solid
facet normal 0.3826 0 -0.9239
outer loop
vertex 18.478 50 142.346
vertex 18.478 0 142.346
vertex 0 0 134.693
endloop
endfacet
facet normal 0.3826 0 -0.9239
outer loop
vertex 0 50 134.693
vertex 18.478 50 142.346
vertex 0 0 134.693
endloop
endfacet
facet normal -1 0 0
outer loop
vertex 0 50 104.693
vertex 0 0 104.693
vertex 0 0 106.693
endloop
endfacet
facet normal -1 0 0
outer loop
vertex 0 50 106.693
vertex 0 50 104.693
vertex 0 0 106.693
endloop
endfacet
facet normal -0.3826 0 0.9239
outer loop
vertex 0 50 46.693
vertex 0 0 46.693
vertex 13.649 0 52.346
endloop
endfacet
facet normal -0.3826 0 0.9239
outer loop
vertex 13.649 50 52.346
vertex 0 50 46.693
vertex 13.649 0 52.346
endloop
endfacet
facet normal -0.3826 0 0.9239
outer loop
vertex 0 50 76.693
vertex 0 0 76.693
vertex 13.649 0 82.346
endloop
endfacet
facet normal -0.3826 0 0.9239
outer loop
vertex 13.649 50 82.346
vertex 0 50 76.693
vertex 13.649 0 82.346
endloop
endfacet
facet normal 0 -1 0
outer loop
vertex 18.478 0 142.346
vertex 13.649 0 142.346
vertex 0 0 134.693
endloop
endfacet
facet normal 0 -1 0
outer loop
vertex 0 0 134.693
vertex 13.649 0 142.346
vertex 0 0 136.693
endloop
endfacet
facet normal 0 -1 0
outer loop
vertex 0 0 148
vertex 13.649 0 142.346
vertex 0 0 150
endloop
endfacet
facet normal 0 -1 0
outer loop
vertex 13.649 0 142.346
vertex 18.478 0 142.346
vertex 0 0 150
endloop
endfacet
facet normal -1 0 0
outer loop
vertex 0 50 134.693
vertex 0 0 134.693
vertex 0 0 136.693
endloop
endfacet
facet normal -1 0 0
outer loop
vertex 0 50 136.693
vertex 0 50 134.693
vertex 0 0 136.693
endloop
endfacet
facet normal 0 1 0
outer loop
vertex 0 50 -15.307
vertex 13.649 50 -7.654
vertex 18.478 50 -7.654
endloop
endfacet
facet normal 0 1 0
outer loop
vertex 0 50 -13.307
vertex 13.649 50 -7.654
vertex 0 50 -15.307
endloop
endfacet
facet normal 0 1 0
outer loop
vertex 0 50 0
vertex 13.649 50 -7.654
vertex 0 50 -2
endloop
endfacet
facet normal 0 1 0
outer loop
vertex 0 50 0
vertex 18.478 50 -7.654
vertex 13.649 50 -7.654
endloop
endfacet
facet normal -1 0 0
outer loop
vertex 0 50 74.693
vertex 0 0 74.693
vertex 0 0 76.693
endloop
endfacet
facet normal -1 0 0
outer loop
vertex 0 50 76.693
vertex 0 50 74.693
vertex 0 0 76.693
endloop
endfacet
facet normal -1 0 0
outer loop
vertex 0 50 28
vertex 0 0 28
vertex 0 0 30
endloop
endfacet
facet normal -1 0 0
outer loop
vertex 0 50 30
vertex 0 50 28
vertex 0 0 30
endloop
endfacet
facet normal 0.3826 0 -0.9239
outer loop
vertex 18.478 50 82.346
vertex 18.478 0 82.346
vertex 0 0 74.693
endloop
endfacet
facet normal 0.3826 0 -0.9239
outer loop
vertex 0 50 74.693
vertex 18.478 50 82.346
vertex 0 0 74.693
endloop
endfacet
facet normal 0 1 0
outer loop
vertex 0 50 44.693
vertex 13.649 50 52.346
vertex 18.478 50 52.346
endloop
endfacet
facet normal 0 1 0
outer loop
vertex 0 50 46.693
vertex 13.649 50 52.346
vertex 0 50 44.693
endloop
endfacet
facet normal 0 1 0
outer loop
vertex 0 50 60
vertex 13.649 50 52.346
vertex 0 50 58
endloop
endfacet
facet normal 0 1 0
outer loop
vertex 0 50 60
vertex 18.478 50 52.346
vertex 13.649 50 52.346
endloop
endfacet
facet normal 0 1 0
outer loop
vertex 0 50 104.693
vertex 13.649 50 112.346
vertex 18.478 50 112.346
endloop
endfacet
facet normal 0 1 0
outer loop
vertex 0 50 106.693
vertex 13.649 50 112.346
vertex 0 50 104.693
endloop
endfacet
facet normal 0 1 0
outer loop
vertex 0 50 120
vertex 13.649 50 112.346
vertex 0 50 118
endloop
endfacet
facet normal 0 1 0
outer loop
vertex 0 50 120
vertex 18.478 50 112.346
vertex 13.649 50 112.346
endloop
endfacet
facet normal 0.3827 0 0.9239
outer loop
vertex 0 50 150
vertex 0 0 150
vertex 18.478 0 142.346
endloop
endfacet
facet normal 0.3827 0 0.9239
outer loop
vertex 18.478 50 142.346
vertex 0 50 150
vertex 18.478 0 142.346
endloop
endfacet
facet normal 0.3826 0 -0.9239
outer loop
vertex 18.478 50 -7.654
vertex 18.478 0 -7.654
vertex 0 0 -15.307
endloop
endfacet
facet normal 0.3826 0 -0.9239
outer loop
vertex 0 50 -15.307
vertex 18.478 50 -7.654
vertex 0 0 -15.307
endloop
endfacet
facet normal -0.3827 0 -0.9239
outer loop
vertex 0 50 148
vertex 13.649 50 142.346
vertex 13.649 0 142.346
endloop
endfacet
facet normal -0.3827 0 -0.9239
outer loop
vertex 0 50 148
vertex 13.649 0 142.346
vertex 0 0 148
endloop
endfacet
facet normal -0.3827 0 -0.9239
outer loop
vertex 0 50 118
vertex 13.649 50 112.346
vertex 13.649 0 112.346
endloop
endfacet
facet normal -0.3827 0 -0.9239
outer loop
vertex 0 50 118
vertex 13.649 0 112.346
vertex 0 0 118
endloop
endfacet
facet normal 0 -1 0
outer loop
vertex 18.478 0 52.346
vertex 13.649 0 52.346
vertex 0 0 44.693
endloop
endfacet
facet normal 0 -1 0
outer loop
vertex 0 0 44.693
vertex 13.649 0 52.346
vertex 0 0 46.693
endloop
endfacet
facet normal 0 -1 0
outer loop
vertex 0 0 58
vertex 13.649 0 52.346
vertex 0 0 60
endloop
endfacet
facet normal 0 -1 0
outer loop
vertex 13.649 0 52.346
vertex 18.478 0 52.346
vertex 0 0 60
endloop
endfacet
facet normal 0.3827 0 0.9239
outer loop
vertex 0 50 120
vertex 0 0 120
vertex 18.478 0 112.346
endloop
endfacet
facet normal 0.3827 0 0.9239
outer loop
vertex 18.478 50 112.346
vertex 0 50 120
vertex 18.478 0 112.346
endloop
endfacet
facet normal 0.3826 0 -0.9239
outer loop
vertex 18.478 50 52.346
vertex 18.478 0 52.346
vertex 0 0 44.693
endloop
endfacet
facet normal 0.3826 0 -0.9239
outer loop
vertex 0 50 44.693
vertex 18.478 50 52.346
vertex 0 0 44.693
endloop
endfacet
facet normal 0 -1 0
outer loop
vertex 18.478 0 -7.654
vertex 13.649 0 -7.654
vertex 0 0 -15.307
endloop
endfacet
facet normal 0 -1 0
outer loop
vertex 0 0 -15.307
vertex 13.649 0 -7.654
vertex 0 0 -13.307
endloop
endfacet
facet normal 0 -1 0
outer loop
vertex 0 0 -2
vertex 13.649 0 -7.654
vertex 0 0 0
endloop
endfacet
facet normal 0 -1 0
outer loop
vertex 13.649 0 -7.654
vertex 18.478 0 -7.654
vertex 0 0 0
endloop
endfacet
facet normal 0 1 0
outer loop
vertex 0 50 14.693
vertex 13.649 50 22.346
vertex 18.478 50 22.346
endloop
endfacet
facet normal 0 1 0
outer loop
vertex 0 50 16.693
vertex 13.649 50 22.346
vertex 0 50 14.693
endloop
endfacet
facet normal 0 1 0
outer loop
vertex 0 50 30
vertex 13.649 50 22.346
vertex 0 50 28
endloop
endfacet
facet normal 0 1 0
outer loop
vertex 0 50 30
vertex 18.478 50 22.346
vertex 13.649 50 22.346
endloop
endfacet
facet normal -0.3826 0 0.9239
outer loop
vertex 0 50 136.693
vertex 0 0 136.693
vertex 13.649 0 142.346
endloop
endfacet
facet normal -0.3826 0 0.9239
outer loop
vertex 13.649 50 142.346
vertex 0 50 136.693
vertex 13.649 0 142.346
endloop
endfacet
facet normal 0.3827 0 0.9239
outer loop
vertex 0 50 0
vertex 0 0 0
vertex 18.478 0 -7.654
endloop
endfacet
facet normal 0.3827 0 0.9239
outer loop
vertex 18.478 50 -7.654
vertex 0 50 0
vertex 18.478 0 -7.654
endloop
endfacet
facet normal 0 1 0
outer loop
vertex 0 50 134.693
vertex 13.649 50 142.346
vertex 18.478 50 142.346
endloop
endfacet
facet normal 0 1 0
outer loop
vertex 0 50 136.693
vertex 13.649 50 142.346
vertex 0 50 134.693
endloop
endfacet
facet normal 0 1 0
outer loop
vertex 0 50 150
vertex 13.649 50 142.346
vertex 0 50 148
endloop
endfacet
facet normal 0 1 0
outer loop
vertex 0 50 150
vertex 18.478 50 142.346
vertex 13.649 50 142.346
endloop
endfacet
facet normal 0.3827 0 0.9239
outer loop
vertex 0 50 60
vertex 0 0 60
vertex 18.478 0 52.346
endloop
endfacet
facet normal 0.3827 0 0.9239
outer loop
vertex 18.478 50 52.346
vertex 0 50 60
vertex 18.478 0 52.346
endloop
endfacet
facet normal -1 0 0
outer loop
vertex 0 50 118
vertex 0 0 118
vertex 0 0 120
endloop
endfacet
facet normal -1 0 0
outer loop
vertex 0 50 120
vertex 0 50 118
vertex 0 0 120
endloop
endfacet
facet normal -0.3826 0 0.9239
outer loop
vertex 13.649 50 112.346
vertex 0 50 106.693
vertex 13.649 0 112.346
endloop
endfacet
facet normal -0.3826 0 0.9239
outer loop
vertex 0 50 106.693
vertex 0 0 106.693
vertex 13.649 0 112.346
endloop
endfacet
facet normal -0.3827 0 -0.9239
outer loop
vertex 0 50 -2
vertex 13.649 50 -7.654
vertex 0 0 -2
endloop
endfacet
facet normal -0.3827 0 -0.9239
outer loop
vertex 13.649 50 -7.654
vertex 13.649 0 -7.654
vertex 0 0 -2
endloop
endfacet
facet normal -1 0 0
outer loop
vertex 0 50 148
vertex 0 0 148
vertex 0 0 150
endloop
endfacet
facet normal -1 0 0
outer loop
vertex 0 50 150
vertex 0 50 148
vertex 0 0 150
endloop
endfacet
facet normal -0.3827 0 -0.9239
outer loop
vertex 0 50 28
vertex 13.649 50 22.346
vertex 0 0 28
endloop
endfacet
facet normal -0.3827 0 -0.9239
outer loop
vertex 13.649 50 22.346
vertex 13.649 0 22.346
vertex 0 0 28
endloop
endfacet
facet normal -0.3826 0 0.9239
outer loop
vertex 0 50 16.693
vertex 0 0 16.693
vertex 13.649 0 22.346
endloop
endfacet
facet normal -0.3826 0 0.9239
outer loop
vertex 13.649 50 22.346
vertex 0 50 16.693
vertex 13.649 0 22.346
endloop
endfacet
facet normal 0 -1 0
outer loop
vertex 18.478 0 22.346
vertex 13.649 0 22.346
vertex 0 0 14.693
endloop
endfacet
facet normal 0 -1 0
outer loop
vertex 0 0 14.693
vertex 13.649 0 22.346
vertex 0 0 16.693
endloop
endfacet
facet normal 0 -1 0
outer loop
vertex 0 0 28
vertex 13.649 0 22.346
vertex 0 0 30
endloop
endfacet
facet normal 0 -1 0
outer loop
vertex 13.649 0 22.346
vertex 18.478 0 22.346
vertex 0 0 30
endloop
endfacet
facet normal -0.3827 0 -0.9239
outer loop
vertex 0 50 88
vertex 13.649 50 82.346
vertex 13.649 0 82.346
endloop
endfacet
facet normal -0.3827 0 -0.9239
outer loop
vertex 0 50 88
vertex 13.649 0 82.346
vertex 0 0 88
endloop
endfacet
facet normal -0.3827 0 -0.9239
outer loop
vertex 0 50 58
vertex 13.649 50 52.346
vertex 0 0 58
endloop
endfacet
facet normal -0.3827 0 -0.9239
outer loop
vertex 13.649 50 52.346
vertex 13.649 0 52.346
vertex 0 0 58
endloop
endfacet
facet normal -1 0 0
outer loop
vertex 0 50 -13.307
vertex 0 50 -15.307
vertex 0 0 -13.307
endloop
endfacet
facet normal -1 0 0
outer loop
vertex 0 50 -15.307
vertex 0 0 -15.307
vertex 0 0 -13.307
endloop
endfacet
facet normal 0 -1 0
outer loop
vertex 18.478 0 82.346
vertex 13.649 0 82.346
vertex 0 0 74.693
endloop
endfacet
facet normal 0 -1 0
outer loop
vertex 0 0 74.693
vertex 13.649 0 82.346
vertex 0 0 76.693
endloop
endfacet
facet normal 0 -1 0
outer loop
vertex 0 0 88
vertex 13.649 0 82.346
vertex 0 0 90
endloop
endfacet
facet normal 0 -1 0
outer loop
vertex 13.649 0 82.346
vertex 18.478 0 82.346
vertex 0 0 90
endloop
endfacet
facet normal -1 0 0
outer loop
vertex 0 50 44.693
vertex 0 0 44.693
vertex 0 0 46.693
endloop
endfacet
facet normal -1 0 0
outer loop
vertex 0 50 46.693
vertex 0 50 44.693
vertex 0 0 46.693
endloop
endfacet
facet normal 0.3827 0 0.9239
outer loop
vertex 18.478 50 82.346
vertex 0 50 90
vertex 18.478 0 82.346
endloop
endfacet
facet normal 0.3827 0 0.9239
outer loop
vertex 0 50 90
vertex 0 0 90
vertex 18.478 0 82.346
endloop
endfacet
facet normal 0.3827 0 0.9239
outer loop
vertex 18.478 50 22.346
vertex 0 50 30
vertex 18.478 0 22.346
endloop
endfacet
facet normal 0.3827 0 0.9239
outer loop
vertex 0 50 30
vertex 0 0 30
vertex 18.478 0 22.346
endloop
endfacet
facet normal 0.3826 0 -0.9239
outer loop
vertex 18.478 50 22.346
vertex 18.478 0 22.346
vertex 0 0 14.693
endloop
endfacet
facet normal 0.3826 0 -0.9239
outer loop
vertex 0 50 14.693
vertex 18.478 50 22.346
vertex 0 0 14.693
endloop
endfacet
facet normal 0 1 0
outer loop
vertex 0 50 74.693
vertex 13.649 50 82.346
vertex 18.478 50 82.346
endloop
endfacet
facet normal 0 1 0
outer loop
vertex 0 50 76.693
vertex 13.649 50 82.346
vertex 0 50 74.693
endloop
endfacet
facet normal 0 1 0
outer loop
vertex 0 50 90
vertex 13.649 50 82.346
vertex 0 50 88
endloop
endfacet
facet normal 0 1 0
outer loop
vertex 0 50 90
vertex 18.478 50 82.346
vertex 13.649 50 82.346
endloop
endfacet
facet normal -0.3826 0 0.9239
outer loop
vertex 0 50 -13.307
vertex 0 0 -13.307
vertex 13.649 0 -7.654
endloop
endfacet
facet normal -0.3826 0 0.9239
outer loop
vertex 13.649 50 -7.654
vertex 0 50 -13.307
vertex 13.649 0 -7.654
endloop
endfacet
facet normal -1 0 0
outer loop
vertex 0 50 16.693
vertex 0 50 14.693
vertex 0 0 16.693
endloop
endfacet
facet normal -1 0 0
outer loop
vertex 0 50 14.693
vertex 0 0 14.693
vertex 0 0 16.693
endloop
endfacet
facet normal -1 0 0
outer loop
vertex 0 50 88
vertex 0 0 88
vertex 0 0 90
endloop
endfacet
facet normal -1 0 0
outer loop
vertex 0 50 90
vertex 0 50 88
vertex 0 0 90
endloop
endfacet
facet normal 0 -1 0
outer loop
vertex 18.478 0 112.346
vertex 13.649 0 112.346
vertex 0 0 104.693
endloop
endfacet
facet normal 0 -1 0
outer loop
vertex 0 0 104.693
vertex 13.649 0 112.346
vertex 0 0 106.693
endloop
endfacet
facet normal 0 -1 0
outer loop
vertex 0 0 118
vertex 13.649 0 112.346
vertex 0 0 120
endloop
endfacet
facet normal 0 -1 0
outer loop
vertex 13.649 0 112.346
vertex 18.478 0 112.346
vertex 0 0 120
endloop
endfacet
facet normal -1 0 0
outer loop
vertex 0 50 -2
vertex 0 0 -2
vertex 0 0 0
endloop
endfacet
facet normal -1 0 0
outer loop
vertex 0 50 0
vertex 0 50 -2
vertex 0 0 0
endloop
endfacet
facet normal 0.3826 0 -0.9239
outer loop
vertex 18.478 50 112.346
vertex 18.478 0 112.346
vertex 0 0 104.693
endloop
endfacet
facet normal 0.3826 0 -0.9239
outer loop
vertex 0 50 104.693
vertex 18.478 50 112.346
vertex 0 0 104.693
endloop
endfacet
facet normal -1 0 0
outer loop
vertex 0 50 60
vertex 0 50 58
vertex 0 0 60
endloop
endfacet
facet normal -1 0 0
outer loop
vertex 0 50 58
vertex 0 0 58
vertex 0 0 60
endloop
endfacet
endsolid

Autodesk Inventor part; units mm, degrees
ref_plane "YZ Plane" through (0, 0, 0) normal (1, 0, 0) x (0, 1, 0)
ref_plane "XZ Plane" through (0, 0, 0) normal (0, 1, 0) x (-1, 0, 0)
ref_plane "XY Plane" through (0, 0, 0) normal (0, 0, 1) x (1, 0, 0)
sketch "Sketch1" plane through (0, 0, 0) normal (0, 1, 0) x (-1, 0, 0)
  line L0 (0, 0) -> (-18.4776, -7.6537)
  line L1 (-18.4776, -7.6537) -> (0, -15.3073)
  line L2 (0, -15.3073) -> (0, -13.3073)
  line L3 (0, -13.3073) -> (-13.6492, -7.6537)
  line L4 (-13.6492, -7.6537) -> (0, -2)
  line L5 (0, -2) -> (0, 0)
  dimension "d0" = 2
  dimension "d1" = 20
  dimension "d2" = 45
extrude "Extrusion1" add sketch "Sketch1" along normal blind 50
pattern_linear "Rectangular Pattern1" count 6 spacing 30 along (0, 0, 1) of "Extrusion1"
properties part number "45deg_20mm"
